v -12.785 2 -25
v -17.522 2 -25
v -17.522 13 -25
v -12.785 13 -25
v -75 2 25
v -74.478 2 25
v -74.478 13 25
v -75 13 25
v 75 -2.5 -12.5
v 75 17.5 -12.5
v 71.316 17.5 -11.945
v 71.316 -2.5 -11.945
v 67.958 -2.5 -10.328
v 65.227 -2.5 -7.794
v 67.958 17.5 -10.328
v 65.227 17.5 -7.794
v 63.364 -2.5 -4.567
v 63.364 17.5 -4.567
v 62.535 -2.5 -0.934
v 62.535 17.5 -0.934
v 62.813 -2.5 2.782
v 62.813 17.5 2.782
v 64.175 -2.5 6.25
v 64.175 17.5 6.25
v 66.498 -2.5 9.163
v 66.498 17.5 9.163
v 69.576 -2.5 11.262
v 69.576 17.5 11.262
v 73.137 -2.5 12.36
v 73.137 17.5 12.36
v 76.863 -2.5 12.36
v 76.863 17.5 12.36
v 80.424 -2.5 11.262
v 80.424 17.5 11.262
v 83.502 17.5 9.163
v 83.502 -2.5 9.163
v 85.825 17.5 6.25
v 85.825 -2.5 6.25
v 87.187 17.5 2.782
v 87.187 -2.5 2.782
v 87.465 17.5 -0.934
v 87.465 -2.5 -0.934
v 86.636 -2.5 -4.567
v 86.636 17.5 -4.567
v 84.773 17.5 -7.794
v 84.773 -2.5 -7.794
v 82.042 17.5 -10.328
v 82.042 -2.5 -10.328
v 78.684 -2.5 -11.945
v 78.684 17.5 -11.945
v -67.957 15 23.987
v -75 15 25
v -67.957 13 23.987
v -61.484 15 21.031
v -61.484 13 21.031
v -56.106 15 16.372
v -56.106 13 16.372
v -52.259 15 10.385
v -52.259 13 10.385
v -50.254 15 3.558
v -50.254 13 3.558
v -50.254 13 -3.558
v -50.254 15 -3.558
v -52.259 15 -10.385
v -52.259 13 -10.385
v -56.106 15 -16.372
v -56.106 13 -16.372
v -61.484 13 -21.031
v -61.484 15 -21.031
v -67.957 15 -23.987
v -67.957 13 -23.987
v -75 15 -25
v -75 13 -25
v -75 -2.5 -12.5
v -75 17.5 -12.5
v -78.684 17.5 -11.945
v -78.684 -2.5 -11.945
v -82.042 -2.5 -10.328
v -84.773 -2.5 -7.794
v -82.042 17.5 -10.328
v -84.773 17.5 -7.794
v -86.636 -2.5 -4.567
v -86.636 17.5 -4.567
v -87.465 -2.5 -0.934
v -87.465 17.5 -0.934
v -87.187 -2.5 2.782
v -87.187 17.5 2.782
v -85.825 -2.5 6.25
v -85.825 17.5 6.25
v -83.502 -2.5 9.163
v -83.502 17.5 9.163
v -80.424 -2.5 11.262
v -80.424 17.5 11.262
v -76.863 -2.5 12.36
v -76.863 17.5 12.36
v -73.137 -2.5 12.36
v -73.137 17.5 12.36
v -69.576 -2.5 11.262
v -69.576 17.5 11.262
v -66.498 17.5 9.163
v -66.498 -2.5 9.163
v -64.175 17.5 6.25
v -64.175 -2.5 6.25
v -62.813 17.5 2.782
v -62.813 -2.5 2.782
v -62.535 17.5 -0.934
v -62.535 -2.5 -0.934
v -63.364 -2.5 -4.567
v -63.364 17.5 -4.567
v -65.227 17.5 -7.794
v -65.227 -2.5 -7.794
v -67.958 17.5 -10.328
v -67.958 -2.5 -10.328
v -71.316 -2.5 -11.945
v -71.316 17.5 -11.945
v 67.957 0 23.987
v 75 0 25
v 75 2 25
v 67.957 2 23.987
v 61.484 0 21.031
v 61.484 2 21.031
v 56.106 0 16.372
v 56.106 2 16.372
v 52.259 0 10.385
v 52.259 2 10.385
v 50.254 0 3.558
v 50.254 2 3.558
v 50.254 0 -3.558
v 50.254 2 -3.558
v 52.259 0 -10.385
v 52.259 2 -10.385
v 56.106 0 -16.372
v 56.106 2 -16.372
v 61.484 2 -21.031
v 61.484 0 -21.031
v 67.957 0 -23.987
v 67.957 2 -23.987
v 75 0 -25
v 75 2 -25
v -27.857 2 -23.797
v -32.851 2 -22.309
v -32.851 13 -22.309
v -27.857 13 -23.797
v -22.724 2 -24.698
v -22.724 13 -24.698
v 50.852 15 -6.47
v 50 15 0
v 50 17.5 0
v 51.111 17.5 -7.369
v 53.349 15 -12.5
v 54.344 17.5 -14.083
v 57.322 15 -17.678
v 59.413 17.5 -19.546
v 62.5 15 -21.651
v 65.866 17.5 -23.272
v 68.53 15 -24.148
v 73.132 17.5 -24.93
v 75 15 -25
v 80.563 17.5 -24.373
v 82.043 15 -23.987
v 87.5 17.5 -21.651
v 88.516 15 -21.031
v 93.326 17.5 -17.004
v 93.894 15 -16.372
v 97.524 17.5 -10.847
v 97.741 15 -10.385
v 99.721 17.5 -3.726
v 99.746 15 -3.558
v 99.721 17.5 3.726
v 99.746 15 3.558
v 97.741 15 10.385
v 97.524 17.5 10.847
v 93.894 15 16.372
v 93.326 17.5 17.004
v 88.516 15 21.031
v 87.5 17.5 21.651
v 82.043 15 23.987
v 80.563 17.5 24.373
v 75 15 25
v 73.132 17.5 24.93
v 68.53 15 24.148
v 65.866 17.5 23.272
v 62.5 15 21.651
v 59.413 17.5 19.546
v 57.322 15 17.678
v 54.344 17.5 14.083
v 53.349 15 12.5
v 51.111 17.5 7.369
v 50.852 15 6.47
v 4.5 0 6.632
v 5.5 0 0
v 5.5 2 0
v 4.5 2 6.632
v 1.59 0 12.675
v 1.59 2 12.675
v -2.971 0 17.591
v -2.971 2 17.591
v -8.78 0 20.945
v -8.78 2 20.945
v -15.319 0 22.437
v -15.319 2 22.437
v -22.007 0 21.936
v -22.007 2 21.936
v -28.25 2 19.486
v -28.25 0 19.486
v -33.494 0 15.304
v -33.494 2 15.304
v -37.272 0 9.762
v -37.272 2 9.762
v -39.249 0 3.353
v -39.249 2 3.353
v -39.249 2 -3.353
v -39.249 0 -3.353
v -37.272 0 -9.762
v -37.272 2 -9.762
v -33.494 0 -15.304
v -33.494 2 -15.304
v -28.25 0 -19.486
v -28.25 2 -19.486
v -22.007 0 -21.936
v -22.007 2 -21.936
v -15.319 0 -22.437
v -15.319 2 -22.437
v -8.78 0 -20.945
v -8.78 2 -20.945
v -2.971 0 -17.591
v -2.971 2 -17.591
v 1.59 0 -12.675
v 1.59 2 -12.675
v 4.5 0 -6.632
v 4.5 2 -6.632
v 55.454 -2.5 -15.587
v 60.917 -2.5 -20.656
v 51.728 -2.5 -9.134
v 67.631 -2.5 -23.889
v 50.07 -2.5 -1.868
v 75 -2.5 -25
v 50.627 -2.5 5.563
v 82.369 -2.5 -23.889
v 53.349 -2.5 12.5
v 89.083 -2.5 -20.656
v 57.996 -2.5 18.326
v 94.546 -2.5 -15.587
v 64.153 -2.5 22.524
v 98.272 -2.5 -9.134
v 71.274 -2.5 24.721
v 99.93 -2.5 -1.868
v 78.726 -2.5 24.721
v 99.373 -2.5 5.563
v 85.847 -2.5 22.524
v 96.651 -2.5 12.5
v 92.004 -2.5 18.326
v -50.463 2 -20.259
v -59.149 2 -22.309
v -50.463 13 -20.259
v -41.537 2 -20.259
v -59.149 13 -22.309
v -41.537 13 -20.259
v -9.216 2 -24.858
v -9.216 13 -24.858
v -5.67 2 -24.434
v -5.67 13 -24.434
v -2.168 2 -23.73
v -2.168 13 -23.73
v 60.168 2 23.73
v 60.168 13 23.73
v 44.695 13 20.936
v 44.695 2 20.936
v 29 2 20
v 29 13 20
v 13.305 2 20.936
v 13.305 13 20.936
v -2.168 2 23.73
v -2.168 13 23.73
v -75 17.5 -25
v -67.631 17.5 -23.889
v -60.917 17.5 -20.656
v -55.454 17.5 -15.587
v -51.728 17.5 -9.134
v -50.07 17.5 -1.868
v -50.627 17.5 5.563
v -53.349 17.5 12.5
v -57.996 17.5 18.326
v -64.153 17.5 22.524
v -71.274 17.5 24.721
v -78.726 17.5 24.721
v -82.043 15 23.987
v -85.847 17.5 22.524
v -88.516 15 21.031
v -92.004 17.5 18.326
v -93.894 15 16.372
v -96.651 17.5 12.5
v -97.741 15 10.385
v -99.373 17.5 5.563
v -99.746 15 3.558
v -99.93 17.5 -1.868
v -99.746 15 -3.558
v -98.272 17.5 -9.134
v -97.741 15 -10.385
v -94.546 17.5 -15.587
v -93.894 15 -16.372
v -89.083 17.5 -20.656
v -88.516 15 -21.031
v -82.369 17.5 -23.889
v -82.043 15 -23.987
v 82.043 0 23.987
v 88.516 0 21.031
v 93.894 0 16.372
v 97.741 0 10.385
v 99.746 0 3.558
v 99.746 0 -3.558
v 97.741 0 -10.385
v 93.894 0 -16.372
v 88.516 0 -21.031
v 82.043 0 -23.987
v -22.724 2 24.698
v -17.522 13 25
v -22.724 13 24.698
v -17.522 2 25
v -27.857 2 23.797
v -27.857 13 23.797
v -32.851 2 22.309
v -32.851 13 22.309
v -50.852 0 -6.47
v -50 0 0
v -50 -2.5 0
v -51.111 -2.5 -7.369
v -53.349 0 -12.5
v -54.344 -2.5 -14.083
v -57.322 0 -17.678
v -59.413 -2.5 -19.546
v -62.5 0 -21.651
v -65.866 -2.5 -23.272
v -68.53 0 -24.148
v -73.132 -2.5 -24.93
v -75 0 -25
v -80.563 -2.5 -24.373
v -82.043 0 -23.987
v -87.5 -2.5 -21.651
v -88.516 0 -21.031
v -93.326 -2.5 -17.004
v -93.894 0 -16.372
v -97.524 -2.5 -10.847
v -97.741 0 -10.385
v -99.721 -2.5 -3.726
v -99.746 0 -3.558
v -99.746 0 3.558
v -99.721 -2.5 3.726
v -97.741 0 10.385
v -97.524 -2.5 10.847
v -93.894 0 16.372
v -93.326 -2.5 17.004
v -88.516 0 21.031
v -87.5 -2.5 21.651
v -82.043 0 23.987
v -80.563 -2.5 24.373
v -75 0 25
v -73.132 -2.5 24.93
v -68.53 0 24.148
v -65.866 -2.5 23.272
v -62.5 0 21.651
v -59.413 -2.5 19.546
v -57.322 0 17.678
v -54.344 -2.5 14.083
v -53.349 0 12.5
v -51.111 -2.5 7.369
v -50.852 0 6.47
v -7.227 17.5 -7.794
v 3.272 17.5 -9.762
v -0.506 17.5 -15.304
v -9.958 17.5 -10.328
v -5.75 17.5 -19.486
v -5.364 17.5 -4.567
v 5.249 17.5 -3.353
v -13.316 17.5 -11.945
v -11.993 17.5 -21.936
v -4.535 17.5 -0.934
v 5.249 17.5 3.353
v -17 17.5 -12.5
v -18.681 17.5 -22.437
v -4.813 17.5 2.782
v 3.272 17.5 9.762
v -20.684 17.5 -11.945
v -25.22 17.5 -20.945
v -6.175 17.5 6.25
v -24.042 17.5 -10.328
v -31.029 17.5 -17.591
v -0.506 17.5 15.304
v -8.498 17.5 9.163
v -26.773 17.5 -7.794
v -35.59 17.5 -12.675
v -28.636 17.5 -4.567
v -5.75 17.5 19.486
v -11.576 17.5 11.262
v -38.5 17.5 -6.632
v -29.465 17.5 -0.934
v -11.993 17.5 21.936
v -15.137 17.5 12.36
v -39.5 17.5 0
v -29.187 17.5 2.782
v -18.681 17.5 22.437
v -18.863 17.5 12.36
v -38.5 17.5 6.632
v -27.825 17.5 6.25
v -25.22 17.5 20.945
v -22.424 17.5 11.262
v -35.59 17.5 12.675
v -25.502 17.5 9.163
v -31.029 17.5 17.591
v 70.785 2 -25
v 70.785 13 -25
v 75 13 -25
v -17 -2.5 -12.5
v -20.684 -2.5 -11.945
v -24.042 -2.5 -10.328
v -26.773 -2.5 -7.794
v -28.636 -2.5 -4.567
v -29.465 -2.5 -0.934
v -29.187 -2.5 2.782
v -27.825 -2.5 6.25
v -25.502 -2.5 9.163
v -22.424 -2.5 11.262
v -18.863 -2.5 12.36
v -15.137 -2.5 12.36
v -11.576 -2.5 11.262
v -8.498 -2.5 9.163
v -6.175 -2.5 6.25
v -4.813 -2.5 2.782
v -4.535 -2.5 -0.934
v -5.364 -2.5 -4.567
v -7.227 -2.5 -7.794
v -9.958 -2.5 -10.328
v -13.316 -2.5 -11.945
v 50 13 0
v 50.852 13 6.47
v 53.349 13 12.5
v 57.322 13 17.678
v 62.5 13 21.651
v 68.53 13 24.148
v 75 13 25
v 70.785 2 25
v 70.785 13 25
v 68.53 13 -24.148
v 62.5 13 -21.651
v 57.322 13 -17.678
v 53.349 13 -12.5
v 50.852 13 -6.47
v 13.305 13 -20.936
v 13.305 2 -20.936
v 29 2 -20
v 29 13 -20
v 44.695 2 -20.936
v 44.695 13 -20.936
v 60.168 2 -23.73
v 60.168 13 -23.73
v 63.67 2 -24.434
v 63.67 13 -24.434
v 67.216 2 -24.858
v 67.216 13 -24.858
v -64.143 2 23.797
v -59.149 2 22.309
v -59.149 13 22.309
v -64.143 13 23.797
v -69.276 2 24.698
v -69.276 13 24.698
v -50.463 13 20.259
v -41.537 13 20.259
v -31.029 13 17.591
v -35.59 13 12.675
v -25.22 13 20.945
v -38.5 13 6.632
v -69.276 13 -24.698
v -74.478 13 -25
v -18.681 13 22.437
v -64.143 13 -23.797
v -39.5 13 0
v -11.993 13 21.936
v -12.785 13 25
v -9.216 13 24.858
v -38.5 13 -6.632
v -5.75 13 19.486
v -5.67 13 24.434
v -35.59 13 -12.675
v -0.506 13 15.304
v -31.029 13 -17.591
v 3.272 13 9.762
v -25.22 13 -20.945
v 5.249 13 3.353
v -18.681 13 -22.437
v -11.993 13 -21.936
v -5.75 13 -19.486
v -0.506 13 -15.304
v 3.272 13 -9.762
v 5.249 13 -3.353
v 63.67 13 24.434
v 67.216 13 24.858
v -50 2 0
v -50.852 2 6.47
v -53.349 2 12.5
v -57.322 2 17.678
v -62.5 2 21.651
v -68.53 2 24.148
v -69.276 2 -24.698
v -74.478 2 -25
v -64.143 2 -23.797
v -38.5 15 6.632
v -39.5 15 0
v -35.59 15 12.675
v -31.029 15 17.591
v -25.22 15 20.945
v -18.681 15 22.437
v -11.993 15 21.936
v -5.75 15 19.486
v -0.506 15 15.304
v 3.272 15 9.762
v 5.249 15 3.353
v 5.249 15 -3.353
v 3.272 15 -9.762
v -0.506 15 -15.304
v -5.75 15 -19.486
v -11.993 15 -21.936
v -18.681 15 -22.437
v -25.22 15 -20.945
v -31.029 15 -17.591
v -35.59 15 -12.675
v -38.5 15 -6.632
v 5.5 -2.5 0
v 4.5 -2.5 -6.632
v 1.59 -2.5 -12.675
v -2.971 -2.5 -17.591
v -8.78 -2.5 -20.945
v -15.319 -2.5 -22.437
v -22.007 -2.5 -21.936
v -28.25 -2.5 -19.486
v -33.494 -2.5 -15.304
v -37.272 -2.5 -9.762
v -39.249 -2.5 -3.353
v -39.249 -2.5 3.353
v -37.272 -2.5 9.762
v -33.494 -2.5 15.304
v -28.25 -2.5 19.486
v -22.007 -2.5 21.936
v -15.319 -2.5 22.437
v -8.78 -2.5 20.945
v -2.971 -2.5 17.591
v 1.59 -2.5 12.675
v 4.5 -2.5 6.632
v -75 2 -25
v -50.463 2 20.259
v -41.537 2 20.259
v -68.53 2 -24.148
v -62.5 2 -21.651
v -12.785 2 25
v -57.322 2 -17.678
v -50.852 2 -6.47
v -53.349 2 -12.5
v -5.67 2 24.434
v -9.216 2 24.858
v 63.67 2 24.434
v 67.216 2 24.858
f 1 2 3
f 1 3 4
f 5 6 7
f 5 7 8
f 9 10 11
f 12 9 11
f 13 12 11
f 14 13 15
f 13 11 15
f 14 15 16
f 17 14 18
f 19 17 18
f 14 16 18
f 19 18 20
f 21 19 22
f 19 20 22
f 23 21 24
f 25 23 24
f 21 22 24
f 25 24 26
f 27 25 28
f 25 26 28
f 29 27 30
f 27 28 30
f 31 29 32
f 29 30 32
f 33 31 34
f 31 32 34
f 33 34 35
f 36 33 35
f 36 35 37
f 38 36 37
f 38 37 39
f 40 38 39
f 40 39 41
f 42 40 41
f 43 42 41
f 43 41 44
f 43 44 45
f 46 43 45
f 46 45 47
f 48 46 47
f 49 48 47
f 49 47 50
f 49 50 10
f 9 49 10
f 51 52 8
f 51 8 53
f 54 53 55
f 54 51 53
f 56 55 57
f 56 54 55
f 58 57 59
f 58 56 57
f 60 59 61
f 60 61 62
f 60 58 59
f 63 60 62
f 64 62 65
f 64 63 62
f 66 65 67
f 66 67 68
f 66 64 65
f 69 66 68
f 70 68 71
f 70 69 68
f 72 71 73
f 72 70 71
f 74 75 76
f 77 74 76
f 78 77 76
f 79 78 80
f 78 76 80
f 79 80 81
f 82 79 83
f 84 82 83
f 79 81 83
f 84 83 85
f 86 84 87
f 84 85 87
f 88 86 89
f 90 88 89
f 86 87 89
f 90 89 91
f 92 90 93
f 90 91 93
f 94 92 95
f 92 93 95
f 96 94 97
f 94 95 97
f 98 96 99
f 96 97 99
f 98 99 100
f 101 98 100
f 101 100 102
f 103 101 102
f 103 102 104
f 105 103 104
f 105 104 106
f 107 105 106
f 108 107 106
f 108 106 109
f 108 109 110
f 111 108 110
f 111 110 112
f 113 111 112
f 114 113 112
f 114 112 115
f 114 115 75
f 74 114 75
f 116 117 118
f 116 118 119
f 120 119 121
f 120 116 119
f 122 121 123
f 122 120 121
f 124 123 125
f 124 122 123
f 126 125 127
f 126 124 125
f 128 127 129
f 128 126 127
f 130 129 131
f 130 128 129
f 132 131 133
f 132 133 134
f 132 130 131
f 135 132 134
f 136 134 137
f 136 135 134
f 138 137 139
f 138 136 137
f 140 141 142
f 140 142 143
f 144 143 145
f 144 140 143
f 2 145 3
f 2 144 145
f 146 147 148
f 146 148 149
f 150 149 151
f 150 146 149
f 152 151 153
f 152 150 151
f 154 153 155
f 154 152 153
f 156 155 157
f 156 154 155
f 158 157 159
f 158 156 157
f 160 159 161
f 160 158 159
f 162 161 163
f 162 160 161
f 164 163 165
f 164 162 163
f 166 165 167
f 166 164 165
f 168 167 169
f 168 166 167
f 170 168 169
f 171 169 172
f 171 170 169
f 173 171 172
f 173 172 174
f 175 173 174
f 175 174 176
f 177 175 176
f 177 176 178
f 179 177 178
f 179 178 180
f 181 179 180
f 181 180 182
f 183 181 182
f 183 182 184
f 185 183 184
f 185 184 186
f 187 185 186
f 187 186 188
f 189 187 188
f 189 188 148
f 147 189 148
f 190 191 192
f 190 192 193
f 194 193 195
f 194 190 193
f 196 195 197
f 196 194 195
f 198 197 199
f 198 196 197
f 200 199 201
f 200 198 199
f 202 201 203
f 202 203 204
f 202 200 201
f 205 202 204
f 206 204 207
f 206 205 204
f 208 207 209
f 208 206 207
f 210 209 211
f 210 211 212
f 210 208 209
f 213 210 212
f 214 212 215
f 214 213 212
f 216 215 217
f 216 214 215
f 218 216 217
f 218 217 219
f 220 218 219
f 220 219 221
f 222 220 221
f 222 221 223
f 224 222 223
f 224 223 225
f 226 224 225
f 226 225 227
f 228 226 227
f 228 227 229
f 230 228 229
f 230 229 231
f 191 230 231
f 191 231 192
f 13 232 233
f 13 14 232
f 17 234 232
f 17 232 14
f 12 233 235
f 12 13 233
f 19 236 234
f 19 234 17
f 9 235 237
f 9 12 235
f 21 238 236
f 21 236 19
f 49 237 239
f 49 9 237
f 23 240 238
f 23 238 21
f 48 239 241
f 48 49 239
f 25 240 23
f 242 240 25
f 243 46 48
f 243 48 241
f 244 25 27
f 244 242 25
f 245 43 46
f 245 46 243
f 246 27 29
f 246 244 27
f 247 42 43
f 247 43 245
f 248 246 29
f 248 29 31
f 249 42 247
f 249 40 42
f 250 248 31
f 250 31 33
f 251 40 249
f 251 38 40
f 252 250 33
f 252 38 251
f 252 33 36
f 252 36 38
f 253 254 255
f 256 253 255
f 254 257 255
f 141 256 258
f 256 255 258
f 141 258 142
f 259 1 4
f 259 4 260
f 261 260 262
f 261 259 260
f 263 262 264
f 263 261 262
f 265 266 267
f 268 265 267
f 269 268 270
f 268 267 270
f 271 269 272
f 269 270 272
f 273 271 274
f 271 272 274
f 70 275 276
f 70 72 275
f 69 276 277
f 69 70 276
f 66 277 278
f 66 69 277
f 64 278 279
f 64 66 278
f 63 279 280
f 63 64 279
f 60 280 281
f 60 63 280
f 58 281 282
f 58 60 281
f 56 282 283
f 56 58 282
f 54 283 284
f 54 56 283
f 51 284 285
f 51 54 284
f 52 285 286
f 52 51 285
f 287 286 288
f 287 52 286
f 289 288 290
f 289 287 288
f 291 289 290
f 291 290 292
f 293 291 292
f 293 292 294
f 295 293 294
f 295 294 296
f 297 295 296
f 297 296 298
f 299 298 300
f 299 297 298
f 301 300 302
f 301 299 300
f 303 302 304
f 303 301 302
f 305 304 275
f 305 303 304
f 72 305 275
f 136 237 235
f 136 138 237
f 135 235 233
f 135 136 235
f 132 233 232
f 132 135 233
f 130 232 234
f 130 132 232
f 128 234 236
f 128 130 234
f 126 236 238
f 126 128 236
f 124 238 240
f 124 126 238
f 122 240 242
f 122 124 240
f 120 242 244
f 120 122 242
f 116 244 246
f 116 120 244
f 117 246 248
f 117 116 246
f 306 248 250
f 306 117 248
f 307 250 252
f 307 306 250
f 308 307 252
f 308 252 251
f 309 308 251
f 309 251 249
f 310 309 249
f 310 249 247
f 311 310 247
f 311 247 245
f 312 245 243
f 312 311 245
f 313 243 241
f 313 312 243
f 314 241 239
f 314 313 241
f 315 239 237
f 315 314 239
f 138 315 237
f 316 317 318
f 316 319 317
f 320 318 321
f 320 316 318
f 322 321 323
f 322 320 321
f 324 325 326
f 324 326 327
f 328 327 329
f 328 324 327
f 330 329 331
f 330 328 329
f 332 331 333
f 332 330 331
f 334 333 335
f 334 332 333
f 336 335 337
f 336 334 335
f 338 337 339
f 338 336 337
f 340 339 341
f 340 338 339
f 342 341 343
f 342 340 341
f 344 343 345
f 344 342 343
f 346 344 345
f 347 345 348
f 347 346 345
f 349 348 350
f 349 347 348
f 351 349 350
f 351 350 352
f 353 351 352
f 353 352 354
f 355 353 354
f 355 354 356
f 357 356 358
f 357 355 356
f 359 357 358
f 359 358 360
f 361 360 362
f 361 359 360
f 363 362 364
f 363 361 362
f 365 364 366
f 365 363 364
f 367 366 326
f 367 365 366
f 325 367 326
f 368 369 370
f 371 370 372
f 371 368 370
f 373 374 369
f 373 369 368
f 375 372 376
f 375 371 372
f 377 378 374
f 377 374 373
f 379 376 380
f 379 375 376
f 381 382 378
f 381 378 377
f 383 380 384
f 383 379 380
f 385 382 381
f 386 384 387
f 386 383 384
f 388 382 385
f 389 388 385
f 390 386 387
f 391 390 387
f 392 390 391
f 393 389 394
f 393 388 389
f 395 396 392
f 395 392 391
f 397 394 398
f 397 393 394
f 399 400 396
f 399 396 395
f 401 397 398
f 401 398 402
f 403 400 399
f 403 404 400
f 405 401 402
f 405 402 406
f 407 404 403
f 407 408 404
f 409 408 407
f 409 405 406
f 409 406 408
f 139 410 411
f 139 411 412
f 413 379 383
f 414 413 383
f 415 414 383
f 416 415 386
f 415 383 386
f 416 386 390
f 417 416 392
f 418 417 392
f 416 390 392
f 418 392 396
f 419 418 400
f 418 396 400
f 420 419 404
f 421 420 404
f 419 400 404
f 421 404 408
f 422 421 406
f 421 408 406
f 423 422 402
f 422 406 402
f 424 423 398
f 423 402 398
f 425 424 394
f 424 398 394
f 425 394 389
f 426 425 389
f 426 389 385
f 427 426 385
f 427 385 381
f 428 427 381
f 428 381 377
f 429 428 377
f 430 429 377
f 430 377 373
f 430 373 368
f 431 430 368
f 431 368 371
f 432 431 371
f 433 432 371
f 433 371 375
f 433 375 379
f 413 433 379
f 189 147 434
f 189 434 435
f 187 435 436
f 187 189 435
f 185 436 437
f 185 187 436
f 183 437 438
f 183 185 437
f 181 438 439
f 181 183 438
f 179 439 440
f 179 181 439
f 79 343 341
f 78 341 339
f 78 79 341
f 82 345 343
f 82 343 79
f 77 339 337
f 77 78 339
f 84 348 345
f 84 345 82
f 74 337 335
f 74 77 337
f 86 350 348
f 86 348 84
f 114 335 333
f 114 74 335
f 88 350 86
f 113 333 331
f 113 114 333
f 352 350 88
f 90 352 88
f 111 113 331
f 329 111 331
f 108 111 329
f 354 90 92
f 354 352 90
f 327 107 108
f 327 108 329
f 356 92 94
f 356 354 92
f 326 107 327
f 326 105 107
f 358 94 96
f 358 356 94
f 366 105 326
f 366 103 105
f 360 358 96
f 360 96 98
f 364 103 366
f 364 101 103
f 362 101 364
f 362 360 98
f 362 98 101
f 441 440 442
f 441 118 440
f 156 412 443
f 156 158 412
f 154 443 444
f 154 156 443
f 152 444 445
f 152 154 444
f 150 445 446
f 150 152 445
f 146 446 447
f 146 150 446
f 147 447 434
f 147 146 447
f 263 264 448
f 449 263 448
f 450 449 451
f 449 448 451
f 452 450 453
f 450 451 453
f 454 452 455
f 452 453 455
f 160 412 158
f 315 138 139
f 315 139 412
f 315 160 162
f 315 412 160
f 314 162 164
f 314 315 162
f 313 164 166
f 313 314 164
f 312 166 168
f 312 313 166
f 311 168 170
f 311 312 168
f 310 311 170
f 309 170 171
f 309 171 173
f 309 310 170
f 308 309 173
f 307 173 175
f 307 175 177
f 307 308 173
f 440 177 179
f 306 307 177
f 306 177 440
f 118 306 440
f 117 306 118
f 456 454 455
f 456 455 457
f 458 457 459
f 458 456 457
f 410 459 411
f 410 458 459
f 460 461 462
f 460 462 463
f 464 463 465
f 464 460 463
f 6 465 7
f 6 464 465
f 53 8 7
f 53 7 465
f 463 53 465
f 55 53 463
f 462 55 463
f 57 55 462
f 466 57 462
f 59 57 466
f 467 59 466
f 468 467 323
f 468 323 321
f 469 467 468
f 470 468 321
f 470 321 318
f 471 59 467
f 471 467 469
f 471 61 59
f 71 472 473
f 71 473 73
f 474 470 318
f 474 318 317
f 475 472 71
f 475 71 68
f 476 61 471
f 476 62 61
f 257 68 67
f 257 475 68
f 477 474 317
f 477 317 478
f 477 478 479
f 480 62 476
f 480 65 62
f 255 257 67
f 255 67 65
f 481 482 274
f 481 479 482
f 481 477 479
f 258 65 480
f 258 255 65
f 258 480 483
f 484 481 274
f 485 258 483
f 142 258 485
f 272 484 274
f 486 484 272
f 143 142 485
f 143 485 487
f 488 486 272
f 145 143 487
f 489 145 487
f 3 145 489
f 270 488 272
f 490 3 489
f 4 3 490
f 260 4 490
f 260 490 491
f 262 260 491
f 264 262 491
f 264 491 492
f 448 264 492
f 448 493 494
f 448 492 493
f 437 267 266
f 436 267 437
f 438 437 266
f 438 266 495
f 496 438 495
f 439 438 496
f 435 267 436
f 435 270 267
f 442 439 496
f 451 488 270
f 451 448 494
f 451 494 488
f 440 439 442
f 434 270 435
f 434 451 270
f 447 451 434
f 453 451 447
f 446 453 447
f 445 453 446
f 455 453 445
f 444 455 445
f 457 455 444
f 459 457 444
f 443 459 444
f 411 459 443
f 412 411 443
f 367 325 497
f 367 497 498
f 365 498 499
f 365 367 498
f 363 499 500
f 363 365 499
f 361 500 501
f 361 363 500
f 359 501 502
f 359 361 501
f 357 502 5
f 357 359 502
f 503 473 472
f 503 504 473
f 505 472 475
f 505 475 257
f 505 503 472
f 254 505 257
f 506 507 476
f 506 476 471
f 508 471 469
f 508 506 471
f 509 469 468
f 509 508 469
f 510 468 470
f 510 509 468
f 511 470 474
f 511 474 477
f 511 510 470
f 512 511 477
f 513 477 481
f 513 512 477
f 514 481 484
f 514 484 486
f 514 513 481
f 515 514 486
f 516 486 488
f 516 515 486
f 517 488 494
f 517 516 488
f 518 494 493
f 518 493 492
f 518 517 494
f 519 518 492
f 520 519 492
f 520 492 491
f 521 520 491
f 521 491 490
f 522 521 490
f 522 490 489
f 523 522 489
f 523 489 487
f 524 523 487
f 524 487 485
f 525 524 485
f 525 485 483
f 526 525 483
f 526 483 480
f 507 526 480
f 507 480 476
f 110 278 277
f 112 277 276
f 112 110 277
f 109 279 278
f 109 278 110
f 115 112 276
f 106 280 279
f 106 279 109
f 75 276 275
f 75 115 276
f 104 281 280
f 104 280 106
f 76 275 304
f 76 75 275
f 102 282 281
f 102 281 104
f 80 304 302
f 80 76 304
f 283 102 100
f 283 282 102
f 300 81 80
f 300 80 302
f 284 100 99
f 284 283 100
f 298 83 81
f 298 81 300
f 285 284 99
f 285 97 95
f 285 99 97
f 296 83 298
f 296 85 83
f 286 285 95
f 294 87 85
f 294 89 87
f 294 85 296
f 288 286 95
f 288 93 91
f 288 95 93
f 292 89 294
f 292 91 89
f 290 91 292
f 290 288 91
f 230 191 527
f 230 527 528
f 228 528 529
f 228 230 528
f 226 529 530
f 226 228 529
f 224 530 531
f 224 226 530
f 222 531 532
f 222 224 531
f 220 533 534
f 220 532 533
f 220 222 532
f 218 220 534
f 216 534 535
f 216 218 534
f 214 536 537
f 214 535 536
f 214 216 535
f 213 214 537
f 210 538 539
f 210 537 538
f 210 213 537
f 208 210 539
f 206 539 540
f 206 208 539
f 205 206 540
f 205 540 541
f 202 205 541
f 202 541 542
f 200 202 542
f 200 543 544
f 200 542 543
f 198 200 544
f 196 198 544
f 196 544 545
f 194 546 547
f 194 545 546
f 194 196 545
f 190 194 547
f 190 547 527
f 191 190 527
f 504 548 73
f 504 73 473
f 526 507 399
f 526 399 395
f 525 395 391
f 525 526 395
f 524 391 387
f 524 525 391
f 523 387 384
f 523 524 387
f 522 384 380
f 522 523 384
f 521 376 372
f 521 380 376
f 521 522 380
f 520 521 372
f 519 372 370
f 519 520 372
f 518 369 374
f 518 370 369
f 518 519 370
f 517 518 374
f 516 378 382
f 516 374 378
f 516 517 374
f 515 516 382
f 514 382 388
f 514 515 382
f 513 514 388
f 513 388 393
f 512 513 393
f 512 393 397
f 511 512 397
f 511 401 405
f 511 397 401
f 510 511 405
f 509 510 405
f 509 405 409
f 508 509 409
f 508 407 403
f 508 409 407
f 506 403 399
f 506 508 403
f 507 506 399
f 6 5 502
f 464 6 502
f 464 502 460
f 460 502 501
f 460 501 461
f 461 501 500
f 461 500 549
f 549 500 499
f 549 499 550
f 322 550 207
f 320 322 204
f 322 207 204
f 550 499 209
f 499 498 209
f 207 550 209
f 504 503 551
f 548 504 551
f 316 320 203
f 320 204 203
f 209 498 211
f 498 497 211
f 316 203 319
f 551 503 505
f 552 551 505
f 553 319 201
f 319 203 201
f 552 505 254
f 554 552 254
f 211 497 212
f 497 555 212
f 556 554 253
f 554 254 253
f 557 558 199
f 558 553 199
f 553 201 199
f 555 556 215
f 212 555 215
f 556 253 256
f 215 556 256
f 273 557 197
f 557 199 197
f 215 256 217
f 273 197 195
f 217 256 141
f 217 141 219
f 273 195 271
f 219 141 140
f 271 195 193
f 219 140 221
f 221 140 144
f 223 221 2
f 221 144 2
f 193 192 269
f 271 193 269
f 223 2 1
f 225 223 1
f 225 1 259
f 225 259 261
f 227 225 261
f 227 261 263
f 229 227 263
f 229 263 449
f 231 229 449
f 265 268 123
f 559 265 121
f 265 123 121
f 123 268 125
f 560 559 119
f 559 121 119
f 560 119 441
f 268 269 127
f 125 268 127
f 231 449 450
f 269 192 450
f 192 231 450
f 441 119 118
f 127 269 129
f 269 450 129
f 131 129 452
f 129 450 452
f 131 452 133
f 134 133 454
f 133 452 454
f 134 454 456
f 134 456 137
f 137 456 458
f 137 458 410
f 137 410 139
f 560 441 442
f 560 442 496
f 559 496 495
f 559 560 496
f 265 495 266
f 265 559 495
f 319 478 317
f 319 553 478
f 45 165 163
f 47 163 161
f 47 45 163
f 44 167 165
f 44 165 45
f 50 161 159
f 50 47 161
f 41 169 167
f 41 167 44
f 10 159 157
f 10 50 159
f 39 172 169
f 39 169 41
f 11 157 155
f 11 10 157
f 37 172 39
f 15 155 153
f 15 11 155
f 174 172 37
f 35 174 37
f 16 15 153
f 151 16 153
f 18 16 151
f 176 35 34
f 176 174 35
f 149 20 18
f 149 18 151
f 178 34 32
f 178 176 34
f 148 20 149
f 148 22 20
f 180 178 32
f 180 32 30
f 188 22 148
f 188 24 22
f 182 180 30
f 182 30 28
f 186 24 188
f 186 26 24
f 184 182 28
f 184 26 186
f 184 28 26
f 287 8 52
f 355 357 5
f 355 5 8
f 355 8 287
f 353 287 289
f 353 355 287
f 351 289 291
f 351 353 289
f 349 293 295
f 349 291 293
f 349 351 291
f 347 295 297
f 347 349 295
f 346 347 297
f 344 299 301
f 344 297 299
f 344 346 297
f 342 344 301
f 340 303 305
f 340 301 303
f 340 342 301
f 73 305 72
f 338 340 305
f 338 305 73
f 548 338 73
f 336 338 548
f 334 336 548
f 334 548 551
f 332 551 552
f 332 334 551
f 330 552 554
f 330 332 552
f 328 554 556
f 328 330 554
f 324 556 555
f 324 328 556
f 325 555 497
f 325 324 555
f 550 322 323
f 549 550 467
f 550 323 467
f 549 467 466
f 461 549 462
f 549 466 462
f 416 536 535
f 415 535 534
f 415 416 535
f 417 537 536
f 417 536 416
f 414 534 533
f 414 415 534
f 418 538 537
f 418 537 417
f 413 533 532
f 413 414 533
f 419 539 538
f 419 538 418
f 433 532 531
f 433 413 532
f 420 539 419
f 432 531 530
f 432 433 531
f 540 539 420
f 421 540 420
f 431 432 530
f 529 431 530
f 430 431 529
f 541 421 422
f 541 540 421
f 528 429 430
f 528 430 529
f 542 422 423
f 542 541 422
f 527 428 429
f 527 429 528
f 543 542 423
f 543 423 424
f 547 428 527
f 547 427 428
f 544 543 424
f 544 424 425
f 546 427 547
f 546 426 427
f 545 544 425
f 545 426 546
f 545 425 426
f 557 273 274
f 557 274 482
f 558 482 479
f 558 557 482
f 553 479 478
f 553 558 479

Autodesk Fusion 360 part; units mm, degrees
sketch "Sketch1" plane through (0, 0, 0) normal (0, 1, 0) x (1, 0, 0)
  line L0 (75, -25) -> (-75, -25)
  line L1 (-75, -25) -> (-75, 25)
  line L2 (-75, 25) -> (75, 25)
  line L3 (75, 25) -> (75, -25)
  line L4 (75, -25) -> (-75, 25) construction
  line L5 (-75, -25) -> (75, 25) construction
  circle A0 centre (-75, 0) radius 25
  circle A1 centre (75, 0) radius 25
  dimension "d1" = 150
  dimension "d2" = 50
extrude "Extrude1" add sketch "Sketch1" along normal blind 15
sketch "Sketch2" plane through (0, 15, 0) normal (0, 1, 0) x (-1, 0, 0)
  arc A0 (75, -25) -> (75, 25) centre (75, 0) ccw
  line L0 (75, 25) -> (-75, 25)
  arc A1 (-75, 25) -> (-75, -25) centre (-75, 0) ccw
  line L1 (-75, -25) -> (75, -25)
  circle A2 centre (75, 0) radius 25
  circle A3 centre (-75, 0) radius 25
  circle A4 centre (17, 0) radius 22.5
  dimension "d5" = 50
  dimension "d6" = 50
  dimension "d7" = 45
  dimension "d8" = 25
  dimension "d9" = 45
  dimension "d10" = 58
extrude "Extrude2" add sketch "Sketch2" along normal blind 2.5 contours A0 A2 | A1 A3 | A4
sketch "Sketch3" plane through (0, 0, 0) normal (0, -1, 0) x (1, 0, 0)
  arc A0 (-75, 25) -> (-75, -25) centre (-75, 0) ccw
  line L0 (-75, -25) -> (75, -25)
  arc A1 (75, -25) -> (75, 25) centre (75, 0) ccw
  line L1 (75, 25) -> (-75, 25)
  circle A2 centre (-75, 0) radius 25
  circle A3 centre (-17, 0) radius 22.5
  circle A4 centre (75, 0) radius 25
  dimension "d13" = 45
  dimension "d14" = 58
  dimension "d15" = 45
  dimension "d16" = 25
  dimension "d17" = 50
  dimension "d18" = 50
extrude "Extrude3" add sketch "Sketch3" along normal blind 2.5 contours A0 A2 | A1 A4 | A3
sketch "Sketch4" plane through (0, -2.5, 0) normal (0, -1, 0) x (1, 0, 0)
  circle A0 centre (-75, 0) radius 25
  line L0 (-75, 0) -> (-75, 15.3312)
  line L1 (-17, 0) -> (-17, 15)
  line L2 (75, 0) -> (75, 15)
  dimension "d21" = 15
  dimension "d22" = 15
  dimension "d29" = 58
  dimension "d30" = 92
hole "Hole1" at (-75, -2.5, 0) at (-17, -2.5, 0) at (75, -2.5, 0) direction (0, 1, 0) diameter 25 depth 20 tip angle 118
sketch "Sketch5" plane through (0, 15, 0) normal (0, 1, 0) x (-1, 0, 0)
  arc A0 (-75, -25) -> (-75, 25) centre (-75, 0) ccw
  line L0 (-75, -25) -> (75, -25)
  arc A1 (75, 25) -> (75, -25) centre (75, 0) ccw
  line L1 (75, 25) -> (-75, 25)
  circle A2 centre (17, 0) radius 22.5
  line L2 (17, 0) -> (17, -25)
  line L3 (17, -25) -> (7, -25)
  line L4 (17, 0) -> (17, 25)
  line L5 (17, 25) -> (7, 25)
  line L6 (-75, -25) -> (-65, -25)
  line L7 (-75, 25) -> (-65, 25)
  line L8 (7, 25) -> (-29, 25)
  line L9 (-29, 25) -> (-29, -20)
  line L10 (-29, 25) -> (-29, 20)
  arc A3 (7, -25) -> (-65, -25) centre (-29, -152.1) ccw
  arc A4 (-65, 25) -> (7, 25) centre (-29, 152.1) ccw
  line L11 (75, 25) -> (65, 25)
  line L12 (75, -25) -> (65, -25)
  line L13 (17, -25) -> (27, -25)
  line L14 (17, 25) -> (27, 25)
  line L15 (65, 25) -> (46, 25)
  line L16 (46, 25) -> (46, 20)
  line L17 (46, 20) -> (46, -20)
  arc A5 (65, -25) -> (27, -25) centre (46, -58.6) ccw
  arc A6 (27, 25) -> (65, 25) centre (46, 58.6) ccw
  dimension "d31" = 10
  dimension "d32" = 10
  dimension "d33" = 36
  dimension "d34" = 45
  dimension "d35" = 19
  dimension "d36" = 40
  dimension "d37" = 29
  dimension "d38" = 132.1
  dimension "d39" = 132.1
  dimension "d40" = 10
  dimension "d41" = 38.6
  dimension "d42" = 38.6
  dimension "d43" = 10
  dimension "d44" = 10
  dimension "d45" = 10
extrude "Extrude4" cut sketch "Sketch5" against normal blind 15 contours L0 A3 | L1 L9 L10 A4 | L1 L8 L9 L10 A4 | L0 A5 | L1 L16 A6 | L1 L15 L16 A6
fillet "Fillet1" radius 45 8 edges at (-65, 7.5, -25) (-27, 7.5, -25) (-7, 7.5, -25) (65, 7.5, -25) (-65, 7.5, 25) (-27, 7.5, 25) (-7, 7.5, 25) (65, 7.5, 25)
extrude "Extrude5" cut 1 faces at (21.1667, 0, 0) along direction (0, 1, 0) blind 2
extrude "Extrude6" cut 1 faces at (21.1667, 15, 0) along direction (0, -1, 0) blind 2
equation "d33 = ( 72 / 2 ) * 1 mm"
equation "d35 = ( 38 / 2 ) * 1 mm"
